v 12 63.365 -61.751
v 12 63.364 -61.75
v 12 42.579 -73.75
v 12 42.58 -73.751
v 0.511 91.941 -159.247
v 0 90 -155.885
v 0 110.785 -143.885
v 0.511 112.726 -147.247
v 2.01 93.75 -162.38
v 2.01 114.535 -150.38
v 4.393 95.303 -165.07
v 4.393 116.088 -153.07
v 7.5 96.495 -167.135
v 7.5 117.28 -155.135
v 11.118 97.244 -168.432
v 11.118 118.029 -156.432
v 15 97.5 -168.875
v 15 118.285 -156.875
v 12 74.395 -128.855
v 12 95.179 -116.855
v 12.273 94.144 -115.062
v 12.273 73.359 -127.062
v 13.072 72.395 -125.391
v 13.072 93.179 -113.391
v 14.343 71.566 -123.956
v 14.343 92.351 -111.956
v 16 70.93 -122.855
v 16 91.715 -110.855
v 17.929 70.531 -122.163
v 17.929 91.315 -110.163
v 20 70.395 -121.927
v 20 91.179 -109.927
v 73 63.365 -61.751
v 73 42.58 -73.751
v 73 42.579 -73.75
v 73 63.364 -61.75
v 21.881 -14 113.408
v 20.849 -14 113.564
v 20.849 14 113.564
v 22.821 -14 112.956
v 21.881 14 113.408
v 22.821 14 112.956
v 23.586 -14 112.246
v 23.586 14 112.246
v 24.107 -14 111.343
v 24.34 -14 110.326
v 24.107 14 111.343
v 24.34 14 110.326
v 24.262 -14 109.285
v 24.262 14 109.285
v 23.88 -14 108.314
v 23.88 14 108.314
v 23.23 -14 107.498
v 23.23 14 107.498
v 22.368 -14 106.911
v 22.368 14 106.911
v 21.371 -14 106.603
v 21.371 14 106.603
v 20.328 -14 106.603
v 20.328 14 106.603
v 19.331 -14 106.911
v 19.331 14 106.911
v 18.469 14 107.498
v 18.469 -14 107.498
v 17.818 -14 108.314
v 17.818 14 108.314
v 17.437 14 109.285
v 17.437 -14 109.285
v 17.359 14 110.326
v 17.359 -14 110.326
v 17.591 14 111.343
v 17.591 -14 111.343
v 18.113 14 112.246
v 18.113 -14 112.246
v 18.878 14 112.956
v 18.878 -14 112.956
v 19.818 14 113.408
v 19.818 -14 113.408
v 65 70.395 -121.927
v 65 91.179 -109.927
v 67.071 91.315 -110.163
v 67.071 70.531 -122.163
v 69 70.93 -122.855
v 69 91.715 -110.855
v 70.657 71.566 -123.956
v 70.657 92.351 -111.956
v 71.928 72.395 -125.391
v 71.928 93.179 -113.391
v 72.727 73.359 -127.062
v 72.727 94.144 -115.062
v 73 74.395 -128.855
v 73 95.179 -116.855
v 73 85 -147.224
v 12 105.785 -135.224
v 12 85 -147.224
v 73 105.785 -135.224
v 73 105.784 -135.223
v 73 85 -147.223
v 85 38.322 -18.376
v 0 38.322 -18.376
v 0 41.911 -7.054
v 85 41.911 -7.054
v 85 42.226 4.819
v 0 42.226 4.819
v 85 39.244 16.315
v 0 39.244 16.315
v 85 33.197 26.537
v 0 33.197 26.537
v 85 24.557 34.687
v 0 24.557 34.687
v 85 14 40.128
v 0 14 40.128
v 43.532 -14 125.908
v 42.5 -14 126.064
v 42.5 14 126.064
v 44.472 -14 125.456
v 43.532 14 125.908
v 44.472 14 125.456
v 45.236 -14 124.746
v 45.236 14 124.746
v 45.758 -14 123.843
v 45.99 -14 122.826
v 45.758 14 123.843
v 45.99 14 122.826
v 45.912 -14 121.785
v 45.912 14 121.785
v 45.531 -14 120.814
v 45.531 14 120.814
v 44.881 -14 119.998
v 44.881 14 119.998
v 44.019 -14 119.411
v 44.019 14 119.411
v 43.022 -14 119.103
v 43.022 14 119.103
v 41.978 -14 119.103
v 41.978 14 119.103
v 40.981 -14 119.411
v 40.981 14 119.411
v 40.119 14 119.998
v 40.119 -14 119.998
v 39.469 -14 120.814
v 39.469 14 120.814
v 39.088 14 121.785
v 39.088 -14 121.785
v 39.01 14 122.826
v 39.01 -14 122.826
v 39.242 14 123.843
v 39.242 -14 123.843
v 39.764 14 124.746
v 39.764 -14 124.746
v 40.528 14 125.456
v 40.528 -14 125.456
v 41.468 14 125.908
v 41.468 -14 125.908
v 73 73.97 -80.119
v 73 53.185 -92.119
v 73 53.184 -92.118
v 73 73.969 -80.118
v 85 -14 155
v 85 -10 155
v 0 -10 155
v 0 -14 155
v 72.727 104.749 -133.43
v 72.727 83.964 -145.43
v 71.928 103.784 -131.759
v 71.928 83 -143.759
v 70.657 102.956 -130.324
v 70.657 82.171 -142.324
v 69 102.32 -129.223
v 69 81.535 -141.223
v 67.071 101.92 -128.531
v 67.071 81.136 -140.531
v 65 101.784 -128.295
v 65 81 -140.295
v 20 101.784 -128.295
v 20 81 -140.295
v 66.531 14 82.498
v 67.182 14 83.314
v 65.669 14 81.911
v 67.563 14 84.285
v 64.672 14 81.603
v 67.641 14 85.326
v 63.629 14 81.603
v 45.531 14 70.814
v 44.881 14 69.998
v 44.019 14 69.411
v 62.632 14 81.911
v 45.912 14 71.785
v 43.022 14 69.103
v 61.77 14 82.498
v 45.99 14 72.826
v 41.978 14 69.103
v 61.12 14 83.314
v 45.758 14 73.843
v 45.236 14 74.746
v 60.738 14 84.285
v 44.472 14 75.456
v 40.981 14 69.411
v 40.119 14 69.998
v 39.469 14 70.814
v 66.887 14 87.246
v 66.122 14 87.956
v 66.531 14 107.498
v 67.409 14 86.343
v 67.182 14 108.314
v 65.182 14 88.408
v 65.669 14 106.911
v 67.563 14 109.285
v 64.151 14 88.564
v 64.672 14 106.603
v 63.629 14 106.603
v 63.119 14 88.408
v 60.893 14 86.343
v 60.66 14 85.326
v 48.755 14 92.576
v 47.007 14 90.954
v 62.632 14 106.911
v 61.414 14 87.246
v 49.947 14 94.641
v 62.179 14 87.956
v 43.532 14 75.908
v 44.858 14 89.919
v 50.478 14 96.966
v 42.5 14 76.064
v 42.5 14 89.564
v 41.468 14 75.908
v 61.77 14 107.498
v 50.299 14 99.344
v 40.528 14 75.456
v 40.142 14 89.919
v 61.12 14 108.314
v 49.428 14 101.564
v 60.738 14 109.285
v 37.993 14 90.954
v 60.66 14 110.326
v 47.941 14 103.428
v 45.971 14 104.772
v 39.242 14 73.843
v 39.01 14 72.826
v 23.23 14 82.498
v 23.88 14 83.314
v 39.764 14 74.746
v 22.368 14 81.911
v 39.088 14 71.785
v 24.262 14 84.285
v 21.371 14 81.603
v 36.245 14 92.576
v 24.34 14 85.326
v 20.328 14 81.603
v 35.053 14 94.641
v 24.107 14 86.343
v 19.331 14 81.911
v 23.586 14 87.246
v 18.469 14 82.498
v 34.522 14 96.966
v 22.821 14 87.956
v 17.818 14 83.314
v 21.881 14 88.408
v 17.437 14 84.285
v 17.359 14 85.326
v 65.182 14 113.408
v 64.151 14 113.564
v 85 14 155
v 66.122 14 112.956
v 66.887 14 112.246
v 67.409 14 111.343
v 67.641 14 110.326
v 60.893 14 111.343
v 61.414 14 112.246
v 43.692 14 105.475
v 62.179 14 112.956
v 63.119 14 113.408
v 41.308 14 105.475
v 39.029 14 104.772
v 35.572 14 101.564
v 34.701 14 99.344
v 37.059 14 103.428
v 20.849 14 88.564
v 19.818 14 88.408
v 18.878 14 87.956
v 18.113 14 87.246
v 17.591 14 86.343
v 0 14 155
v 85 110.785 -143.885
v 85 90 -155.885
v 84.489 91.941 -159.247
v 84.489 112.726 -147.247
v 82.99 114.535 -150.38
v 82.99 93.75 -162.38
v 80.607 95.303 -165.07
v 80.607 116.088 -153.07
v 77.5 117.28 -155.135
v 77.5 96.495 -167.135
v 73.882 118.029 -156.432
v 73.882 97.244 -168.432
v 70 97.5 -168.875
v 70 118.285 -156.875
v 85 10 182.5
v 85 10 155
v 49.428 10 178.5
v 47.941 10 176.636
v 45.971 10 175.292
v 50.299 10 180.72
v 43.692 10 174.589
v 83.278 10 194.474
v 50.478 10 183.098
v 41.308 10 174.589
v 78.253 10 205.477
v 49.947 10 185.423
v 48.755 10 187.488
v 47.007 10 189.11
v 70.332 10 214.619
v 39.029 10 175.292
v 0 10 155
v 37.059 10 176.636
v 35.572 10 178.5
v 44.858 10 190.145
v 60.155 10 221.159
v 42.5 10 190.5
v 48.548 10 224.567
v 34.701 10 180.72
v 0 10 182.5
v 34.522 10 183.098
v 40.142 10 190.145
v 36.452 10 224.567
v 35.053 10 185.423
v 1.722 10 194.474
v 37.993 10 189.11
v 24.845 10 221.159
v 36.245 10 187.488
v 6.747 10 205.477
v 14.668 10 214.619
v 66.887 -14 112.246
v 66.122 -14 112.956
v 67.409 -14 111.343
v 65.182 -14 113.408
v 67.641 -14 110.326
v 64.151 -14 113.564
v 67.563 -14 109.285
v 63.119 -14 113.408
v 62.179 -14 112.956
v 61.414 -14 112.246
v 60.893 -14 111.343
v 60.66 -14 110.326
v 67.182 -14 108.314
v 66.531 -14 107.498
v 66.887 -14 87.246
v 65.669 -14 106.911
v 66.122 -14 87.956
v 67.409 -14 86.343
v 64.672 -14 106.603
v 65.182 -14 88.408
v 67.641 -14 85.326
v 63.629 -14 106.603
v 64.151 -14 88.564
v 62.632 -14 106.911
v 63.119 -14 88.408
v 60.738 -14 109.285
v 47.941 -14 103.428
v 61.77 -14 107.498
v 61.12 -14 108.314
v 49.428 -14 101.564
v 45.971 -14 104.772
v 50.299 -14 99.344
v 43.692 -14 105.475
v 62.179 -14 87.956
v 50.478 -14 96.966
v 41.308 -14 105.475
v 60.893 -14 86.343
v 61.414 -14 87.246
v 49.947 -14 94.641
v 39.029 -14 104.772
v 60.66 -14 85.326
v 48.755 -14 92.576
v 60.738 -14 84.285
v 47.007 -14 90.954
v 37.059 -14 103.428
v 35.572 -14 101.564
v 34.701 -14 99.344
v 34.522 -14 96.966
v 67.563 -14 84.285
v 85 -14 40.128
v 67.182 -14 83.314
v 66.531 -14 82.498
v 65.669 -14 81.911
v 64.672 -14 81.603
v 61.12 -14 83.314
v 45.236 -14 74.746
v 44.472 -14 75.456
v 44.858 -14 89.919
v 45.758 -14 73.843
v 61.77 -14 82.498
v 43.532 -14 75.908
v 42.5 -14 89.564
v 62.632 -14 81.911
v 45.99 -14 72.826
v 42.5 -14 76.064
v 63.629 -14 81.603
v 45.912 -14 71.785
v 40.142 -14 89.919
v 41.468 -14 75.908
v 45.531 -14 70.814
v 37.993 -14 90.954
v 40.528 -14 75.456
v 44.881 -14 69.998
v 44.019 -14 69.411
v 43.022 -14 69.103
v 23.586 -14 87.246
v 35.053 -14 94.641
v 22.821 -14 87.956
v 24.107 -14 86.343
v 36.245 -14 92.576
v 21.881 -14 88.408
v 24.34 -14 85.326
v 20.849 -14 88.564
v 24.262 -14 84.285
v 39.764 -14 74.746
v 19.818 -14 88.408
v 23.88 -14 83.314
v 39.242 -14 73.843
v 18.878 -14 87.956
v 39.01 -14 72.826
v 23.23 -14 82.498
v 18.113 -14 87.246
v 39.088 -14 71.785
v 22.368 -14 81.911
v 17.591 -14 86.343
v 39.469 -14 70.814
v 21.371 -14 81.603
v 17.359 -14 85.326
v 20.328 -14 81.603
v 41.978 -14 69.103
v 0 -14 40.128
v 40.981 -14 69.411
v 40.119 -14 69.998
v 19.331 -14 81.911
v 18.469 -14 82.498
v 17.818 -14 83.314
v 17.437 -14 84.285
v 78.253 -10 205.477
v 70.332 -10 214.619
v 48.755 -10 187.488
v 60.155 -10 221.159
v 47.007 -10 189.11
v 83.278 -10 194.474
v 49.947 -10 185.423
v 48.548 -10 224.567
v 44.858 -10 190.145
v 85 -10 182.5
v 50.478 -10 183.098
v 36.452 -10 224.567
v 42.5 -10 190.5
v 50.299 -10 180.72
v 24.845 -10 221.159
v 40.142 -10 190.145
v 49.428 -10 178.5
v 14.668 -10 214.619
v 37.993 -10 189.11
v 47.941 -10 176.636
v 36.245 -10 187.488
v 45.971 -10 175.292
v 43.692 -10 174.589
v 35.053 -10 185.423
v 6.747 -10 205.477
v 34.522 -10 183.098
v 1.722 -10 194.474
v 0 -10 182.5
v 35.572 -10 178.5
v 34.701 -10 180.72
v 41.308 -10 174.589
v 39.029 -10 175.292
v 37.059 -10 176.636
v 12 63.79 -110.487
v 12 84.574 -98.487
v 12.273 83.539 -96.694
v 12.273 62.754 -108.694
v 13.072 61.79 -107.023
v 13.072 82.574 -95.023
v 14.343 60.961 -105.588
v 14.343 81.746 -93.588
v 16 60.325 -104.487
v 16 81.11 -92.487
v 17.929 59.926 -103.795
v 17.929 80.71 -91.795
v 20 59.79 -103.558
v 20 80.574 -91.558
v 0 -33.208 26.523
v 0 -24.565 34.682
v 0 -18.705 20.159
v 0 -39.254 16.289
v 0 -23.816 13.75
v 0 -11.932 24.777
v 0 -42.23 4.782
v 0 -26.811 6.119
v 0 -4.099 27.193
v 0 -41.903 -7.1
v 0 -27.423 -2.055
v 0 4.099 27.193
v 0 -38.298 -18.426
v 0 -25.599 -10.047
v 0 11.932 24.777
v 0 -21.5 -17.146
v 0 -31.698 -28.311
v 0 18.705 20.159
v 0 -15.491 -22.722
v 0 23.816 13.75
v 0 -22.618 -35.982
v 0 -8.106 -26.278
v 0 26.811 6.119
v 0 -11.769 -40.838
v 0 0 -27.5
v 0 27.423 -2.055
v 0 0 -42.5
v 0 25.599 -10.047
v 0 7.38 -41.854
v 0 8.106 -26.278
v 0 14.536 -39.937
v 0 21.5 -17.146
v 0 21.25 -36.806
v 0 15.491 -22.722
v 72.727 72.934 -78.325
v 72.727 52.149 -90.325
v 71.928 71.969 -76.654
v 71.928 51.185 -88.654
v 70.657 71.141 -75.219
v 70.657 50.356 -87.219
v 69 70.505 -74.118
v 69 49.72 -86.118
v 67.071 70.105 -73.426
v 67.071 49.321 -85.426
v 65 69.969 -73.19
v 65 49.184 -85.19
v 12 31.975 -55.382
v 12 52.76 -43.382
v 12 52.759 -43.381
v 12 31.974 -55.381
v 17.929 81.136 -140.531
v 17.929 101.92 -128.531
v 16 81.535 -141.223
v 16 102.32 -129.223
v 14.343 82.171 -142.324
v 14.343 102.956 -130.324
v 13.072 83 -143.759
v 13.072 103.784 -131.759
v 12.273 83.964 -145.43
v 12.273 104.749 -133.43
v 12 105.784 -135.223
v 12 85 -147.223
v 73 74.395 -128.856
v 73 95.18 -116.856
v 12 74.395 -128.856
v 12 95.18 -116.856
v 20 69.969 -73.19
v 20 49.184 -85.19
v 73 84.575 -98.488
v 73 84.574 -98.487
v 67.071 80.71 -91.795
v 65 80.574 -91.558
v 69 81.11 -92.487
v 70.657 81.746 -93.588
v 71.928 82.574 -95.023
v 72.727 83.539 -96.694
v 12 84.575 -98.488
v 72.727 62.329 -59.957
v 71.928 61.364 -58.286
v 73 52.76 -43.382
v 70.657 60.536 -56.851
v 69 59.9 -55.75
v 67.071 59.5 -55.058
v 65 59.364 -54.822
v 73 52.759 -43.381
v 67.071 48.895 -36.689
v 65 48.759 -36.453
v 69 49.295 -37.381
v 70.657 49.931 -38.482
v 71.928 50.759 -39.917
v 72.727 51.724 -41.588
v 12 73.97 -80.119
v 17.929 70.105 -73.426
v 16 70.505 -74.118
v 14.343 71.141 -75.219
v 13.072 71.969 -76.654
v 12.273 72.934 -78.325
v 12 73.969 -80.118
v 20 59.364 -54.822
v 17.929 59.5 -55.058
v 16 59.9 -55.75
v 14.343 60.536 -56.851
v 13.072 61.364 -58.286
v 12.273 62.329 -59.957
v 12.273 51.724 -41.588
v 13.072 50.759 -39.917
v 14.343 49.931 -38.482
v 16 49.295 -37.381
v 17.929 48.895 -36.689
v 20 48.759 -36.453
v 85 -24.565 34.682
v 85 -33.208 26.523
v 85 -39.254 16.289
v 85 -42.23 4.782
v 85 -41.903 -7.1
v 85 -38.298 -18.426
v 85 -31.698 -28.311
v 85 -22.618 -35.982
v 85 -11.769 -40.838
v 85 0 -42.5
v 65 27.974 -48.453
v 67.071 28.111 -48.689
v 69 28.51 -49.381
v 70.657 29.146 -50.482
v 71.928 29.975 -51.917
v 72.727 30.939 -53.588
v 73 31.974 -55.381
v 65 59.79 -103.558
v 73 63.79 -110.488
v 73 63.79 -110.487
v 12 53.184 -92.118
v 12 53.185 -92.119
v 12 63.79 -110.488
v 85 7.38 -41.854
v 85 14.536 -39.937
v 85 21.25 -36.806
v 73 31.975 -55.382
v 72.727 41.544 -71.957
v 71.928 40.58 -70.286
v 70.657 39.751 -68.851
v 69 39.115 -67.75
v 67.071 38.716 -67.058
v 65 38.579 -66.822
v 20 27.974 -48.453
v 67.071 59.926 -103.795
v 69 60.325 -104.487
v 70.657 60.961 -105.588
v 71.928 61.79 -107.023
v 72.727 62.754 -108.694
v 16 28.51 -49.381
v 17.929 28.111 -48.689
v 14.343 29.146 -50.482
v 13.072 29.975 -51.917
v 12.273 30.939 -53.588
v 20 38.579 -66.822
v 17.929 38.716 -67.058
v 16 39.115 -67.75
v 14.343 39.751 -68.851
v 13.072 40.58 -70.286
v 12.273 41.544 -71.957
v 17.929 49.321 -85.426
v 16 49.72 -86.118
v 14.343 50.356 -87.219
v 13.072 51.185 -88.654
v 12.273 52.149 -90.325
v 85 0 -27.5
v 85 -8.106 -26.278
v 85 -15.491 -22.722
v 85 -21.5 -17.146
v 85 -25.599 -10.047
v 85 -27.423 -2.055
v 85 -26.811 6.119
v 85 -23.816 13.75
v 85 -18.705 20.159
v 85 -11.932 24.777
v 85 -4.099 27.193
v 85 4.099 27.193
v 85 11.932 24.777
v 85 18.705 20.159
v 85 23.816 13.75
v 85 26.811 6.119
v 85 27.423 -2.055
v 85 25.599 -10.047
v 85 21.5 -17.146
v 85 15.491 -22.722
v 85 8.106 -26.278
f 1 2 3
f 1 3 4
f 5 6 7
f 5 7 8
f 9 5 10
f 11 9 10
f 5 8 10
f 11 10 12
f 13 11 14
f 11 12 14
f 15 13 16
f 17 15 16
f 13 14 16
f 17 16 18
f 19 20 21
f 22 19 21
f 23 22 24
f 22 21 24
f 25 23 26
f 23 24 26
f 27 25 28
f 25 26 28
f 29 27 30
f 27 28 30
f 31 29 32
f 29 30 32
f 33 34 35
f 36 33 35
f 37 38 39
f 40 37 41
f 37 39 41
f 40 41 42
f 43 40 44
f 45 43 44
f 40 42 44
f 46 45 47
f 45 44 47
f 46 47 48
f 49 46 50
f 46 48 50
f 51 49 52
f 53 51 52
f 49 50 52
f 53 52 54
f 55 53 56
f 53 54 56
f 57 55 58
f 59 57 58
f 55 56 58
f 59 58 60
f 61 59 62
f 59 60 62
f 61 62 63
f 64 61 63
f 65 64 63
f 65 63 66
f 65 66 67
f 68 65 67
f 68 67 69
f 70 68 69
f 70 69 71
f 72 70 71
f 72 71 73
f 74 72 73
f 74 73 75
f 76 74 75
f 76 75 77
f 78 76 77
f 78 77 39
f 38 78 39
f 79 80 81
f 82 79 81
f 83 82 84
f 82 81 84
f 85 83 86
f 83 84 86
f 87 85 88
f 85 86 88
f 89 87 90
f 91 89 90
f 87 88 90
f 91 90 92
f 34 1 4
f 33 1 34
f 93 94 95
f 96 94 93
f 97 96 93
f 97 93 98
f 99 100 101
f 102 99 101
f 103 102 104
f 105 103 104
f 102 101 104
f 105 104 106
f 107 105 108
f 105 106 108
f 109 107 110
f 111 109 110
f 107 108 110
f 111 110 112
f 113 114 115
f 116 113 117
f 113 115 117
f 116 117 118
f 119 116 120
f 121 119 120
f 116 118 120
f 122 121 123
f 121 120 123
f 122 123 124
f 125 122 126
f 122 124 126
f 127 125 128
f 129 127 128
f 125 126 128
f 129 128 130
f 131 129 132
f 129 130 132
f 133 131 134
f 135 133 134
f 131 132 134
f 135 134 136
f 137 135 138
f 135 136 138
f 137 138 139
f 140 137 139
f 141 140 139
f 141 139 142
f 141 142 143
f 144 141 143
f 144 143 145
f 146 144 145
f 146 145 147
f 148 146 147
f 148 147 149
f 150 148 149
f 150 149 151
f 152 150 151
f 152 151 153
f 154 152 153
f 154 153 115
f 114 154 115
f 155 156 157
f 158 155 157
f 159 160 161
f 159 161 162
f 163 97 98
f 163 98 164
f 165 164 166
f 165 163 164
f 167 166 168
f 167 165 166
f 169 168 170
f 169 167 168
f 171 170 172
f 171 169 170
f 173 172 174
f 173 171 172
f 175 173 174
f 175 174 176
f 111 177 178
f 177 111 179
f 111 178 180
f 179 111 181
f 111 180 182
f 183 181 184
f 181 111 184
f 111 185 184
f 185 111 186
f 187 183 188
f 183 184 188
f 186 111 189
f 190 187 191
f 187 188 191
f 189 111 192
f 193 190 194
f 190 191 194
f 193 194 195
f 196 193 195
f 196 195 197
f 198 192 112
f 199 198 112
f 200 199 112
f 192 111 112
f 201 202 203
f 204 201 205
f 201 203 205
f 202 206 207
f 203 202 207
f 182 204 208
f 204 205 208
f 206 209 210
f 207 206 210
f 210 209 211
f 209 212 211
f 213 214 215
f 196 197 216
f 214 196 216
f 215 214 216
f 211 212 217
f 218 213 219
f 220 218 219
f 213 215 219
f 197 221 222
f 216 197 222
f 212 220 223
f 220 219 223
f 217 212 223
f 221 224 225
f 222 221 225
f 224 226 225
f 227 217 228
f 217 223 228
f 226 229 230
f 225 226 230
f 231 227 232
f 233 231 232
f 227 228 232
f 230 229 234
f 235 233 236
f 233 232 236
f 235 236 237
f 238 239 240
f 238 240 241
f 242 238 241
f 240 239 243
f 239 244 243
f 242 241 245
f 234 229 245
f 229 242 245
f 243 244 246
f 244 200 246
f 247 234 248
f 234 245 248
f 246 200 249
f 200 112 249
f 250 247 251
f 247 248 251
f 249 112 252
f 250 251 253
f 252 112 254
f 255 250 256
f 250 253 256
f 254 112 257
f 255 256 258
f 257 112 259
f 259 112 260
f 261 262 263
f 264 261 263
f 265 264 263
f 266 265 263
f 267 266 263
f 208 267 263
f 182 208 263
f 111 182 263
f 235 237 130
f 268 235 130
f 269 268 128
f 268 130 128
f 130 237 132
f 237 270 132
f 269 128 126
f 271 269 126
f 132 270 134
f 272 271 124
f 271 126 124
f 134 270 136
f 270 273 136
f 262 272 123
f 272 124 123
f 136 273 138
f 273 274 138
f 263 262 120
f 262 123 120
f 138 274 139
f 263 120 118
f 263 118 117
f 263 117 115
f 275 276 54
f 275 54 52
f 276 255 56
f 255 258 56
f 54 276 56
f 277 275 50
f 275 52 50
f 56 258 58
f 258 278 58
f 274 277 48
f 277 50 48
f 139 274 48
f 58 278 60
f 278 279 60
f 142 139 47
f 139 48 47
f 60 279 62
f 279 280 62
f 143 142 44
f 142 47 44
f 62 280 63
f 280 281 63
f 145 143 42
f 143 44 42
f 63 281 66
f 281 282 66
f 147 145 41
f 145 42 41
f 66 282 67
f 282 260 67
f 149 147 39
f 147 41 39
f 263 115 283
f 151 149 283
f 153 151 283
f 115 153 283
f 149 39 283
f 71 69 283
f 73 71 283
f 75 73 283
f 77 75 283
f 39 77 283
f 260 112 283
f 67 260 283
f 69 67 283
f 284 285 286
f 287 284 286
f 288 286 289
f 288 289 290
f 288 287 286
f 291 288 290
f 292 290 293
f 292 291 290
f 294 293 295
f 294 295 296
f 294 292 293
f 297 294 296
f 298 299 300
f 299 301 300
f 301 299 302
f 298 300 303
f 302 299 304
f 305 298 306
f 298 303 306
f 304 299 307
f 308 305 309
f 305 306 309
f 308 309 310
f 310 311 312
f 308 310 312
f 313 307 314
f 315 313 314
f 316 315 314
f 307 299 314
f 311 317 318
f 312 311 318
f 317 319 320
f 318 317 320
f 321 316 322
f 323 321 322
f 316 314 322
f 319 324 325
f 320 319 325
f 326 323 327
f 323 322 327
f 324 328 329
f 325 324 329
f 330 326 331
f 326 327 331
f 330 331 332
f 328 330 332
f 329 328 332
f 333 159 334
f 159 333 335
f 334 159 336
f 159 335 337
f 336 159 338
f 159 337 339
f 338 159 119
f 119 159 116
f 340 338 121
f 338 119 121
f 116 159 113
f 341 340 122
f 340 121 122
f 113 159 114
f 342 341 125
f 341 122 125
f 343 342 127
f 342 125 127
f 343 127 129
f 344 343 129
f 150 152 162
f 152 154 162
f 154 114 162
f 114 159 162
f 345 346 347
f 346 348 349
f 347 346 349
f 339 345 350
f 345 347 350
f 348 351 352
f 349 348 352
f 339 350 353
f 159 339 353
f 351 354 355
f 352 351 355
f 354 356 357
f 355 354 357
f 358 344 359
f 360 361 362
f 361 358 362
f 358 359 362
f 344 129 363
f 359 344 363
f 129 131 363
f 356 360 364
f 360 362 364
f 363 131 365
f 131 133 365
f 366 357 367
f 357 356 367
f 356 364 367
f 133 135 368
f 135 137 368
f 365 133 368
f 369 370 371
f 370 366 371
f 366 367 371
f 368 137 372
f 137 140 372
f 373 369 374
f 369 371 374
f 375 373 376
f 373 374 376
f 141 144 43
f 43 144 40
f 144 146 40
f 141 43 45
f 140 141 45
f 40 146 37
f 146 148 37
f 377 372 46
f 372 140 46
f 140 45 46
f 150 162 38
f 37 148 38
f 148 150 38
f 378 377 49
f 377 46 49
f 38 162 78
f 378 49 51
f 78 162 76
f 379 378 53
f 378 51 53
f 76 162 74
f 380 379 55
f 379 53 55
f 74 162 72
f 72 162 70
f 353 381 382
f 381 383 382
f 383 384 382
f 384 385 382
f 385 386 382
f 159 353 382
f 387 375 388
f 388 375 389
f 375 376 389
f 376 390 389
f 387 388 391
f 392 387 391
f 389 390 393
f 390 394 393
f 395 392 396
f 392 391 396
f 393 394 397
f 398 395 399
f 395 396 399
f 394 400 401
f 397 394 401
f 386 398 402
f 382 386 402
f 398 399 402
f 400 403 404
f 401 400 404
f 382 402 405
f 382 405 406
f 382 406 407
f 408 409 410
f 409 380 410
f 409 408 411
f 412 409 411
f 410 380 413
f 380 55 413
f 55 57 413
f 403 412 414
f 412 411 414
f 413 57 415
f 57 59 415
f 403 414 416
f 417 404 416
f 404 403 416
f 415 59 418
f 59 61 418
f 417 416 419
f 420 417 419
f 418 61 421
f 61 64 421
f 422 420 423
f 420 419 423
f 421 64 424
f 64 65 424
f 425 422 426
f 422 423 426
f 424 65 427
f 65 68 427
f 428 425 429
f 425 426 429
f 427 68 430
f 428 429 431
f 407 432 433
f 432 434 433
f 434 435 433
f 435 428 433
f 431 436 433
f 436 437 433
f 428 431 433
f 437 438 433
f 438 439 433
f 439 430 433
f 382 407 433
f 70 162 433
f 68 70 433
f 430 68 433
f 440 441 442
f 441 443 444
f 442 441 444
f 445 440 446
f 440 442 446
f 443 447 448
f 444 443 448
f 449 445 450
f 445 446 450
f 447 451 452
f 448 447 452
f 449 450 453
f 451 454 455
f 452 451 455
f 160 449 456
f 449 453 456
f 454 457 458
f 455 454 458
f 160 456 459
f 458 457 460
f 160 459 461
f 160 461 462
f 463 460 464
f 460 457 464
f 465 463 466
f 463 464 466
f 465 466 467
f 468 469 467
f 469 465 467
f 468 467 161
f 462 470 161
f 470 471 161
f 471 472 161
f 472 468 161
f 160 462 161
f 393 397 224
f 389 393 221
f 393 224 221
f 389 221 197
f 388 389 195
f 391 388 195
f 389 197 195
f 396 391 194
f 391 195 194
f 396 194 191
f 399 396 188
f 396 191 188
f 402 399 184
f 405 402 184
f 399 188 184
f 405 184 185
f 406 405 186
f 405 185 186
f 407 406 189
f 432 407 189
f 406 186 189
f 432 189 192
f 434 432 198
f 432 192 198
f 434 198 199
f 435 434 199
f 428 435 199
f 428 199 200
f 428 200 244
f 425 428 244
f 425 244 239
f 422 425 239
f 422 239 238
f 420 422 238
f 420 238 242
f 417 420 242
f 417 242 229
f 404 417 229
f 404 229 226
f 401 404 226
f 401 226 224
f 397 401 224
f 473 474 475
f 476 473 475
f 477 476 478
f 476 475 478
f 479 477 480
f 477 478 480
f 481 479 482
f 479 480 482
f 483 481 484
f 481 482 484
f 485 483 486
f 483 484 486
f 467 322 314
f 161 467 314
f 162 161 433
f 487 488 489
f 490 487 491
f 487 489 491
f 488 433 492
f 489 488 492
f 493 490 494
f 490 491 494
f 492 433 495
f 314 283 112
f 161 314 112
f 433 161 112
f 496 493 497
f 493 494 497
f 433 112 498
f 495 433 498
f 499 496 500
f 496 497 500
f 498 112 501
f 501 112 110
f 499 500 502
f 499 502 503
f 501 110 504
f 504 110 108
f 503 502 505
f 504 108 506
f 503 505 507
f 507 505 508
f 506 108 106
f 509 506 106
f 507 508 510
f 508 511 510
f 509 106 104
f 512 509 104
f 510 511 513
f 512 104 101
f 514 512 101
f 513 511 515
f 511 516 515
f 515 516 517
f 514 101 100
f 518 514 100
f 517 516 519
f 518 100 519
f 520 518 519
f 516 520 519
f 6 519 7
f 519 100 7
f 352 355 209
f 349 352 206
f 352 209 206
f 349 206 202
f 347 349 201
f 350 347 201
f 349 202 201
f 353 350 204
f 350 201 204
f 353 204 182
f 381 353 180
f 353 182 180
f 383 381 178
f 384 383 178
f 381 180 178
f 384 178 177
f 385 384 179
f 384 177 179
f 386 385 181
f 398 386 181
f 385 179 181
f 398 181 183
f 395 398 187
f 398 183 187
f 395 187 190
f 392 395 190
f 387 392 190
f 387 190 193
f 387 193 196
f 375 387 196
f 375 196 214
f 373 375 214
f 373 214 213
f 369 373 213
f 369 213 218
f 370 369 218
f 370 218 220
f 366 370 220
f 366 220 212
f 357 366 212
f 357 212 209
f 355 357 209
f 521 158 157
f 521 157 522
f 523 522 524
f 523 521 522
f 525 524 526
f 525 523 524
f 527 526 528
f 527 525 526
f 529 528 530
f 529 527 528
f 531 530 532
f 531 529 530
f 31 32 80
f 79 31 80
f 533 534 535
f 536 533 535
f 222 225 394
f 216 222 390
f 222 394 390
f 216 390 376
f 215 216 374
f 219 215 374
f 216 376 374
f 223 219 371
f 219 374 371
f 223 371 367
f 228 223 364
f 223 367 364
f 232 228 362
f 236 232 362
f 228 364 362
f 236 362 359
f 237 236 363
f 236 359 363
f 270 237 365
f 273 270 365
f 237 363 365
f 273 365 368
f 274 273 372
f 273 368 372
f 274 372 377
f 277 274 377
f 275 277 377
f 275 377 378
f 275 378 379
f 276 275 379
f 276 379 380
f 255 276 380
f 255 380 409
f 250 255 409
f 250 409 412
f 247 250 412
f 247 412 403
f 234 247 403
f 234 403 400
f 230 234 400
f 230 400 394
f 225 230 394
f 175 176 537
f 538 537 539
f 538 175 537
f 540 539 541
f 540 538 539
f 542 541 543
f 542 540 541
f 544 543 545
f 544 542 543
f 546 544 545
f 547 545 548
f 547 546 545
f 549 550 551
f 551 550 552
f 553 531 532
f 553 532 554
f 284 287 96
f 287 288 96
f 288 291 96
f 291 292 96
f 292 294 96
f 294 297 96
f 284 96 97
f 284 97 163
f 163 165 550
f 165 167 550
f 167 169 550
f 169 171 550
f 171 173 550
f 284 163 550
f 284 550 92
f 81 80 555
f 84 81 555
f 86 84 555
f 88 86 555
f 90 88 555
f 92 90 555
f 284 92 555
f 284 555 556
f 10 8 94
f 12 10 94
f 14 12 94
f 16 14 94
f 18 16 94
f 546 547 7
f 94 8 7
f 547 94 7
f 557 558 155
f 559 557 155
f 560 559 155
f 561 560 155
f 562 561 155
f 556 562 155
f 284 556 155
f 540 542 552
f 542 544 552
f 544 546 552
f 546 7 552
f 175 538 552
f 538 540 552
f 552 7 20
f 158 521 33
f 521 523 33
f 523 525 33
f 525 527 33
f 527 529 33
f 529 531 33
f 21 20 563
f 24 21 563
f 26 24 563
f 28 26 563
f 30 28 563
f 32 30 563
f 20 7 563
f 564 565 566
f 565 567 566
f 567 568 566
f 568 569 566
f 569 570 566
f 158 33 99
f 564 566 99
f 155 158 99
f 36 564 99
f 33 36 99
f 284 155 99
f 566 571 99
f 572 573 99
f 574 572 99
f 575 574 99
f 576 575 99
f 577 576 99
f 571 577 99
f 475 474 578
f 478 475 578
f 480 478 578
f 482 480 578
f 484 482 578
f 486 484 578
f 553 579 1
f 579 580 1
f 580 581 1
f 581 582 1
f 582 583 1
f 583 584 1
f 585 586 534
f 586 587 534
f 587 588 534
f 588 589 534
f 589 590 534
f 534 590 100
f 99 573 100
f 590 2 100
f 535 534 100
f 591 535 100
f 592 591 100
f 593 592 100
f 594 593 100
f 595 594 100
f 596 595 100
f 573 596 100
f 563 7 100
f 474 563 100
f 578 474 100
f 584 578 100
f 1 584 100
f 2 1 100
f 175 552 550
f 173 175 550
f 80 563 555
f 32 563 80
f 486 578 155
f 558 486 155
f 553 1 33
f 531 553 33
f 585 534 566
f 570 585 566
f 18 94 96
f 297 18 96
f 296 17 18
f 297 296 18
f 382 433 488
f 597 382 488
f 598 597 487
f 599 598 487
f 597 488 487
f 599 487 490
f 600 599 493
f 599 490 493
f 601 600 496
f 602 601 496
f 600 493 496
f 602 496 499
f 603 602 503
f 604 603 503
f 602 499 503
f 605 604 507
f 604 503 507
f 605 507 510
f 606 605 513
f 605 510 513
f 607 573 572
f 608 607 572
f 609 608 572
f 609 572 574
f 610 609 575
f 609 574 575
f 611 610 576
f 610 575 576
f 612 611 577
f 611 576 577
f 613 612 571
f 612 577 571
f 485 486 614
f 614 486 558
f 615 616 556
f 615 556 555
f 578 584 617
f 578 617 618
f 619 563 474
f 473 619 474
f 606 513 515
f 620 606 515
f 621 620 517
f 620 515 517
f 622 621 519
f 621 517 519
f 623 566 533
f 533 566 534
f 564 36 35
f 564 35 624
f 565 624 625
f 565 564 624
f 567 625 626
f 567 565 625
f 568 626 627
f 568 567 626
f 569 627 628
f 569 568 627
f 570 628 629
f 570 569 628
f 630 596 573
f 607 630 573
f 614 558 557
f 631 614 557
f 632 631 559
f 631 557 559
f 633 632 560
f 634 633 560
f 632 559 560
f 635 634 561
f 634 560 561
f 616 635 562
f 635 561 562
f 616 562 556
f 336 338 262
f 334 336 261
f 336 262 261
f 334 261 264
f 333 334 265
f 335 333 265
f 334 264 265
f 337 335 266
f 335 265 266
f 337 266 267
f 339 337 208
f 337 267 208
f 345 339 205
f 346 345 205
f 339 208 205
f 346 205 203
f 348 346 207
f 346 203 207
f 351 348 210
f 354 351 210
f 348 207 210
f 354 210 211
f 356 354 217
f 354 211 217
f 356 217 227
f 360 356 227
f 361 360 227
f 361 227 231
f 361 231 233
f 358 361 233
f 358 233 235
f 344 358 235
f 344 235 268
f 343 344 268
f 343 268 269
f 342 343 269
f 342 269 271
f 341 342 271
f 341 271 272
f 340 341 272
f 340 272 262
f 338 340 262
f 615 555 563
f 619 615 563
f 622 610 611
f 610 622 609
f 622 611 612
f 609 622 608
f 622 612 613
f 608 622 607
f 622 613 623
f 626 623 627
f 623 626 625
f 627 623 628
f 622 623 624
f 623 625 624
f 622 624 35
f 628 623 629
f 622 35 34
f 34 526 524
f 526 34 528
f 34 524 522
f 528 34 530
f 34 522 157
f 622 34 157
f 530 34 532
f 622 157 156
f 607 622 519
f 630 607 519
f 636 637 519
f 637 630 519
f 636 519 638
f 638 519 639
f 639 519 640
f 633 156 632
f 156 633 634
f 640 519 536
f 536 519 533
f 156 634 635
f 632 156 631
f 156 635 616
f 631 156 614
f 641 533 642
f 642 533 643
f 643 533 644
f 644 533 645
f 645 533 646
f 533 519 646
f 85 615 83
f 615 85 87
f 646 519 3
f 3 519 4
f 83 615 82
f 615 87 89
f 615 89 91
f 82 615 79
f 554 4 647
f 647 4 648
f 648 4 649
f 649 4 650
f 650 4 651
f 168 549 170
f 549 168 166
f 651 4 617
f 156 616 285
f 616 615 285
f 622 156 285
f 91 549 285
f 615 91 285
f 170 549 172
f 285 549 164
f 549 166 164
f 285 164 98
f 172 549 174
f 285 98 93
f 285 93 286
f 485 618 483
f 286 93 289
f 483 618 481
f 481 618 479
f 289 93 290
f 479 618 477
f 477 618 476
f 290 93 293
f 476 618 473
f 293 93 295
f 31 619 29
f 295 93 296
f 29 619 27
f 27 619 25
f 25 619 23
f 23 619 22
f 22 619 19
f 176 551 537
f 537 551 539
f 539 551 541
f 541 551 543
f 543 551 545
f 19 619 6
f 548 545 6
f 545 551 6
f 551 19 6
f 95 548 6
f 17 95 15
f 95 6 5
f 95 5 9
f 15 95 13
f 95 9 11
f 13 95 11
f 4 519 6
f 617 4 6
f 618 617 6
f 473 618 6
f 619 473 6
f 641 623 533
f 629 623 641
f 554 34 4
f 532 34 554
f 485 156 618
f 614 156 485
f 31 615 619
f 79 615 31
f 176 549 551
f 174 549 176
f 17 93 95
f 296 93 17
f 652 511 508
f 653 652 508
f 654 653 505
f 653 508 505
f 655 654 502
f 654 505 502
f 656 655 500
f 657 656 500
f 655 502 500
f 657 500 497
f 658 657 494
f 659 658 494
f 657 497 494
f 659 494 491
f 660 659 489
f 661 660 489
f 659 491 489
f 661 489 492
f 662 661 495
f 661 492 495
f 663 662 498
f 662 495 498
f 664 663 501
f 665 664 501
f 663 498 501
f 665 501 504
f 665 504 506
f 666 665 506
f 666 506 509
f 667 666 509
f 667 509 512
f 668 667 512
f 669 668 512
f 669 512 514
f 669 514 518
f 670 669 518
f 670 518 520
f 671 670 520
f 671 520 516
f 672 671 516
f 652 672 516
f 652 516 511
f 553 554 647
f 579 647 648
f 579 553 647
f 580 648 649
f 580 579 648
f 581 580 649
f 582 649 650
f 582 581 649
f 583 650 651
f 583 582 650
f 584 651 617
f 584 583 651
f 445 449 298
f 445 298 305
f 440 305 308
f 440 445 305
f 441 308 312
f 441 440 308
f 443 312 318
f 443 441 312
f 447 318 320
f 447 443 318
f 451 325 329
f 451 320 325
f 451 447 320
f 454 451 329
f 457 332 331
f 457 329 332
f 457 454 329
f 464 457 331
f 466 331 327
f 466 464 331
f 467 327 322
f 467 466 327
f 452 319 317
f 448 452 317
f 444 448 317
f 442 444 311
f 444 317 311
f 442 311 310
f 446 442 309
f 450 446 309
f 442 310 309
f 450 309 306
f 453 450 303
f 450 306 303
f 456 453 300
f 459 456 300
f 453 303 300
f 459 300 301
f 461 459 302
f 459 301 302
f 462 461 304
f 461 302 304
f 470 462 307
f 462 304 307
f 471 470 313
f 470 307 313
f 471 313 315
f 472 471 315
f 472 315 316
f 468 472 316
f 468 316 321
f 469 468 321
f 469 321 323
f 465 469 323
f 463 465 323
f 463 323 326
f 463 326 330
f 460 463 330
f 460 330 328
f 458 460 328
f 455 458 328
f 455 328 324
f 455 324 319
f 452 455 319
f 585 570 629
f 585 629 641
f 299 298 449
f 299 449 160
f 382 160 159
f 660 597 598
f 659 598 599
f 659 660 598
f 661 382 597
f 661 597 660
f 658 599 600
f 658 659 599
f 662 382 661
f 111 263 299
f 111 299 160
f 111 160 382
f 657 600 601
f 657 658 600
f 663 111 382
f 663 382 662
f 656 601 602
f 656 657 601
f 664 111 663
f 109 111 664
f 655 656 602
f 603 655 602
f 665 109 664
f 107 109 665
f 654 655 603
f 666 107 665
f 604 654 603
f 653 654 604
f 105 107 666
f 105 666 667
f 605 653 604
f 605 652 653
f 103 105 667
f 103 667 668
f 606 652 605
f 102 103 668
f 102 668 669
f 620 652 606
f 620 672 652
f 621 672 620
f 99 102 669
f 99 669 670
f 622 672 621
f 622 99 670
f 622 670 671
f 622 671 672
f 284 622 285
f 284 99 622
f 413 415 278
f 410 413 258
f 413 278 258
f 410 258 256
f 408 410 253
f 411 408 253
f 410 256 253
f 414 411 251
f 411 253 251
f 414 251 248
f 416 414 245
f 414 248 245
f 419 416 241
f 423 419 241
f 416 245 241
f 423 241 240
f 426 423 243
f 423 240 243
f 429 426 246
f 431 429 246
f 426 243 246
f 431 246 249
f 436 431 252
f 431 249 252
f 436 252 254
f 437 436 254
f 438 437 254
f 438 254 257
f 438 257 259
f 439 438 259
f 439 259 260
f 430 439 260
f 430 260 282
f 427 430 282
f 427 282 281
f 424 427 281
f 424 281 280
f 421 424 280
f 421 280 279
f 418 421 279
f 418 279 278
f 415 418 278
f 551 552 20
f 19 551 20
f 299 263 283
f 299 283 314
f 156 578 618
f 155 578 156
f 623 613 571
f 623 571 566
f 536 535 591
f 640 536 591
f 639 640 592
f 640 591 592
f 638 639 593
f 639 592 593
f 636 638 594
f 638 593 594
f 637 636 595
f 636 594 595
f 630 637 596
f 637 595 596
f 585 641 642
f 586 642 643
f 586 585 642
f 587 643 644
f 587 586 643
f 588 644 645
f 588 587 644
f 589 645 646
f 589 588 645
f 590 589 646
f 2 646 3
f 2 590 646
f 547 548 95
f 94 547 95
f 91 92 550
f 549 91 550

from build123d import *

# Parameters (mm, degrees)
BOSS_EXTRUDE1_DEPTH        = 85
F_16_0_55_DIAMETER_HOLE1_D = 55
CUT_EXTRUDE1_DEPTH         = 85
FILLET1_RADIUS             = 42.5
FILLET1_LENGTH             = 20
F_16_0_16_DIAMETER_HOLE1_D = 16
F_16_0_16_DIAMETER_HOLE2_D = 16
SKETCH9_R                  = 3.5
CUT_EXTRUDE2_DEPTH         = 85
FILLET2_R                  = 15


with BuildPart() as part:
    # Sketch1 → Boss-Extrude1 (new body)
    with BuildSketch(Plane(origin=(0, 0, 0), x_dir=(0, 0, -1), z_dir=(1, 0, 0))):
        with BuildLine():
            ThreePointArc((-40.127920454, -14), (-42.5, 0), (-40.127920454, 14))
            Line((-40.127920454, 14), (-155, 14))
            Line((-155, 14), (-155, 10))
            Line((-155, 10), (-225, 10))
            Line((-225, 10), (-225, -10))
            Line((-225, -10), (-155, -10))
            Line((-155, -10), (-155, -14))
            Line((-155, -14), (-40.127920454, -14))
        make_face()
        with BuildLine():
            Line((36.806079661, 21.25), (0, 0))
            Line((0, 0), (0, -10))
            Line((0, -10), (0, -14))
            Line((0, -14), (-40.127920454, -14))
            ThreePointArc((-40.127920454, -14), (7.099766922, -41.902784032), (42.5, 0))
            ThreePointArc((42.5, 0), (41.051847617, 10.999809417), (36.806079661, 21.25))
        make_face()
        with BuildLine():
            Line((0, -10), (0, 0))
            Line((0, 0), (-8.082903769, 14))
            Line((-8.082903769, 14), (-40.127920454, 14))
            ThreePointArc((-40.127920454, 14), (-42.5, 0), (-40.127920454, -14))
            Line((-40.127920454, -14), (0, -14))
            Line((0, -14), (0, -10))
        make_face()
        with BuildLine():
            Line((-40.127920454, 14), (-8.082903769, 14))
            Line((-8.082903769, 14), (-12, 20.784609691))
            Line((-12, 20.784609691), (18.375771595, 38.322069598))
            ThreePointArc((18.375771595, 38.322069598), (-16.315016469, 39.243728641), (-40.127920454, 14))
        make_face()
        Polygon((-8.082903769, 14), (0, 0), (0, 10), (0, 14), align=None)
        with BuildLine():
            Line((0, 10), (0, 0))
            Line((0, 0), (36.806079661, 21.25))
            ThreePointArc((36.806079661, 21.25), (28.88118881, 31.178950157), (18.375771595, 38.322069598))
            Line((18.375771595, 38.322069598), (-12, 20.784609691))
            Line((-12, 20.784609691), (-8.082903769, 14))
            Line((-8.082903769, 14), (0, 14))
            Line((0, 14), (0, 10))
        make_face()
        with BuildLine():
            ThreePointArc((18.375771595, 38.322069598), (28.88118881, 31.178950157), (36.806079661, 21.25))
            Line((36.806079661, 21.25), (168.874953738, 97.5))
            Line((168.874953738, 97.5), (156.874953738, 118.284609691))
            Line((156.874953738, 118.284609691), (18.375771595, 38.322069598))
        make_face()
    extrude(amount=BOSS_EXTRUDE1_DEPTH)

    # Ø16.0 (55) Diameter Hole1 (through all)
    with Locations(Plane(origin=(85, 0, 0), x_dir=(0, 0, 1), z_dir=(1, 0, 0))):
        with Locations((0, 0)):
            Hole(F_16_0_55_DIAMETER_HOLE1_D / 2)

    # Sketch3 → Cut-Extrude1 (cut)
    with BuildSketch(Plane(origin=(0, 20.784609691, 12), x_dir=(1, 0, 0), z_dir=(0, 0.8660254037844386, 0.5000000000000002))):
        with BuildLine():
            Line((73, 127.58), (12, 127.58))
            Line((12, 127.58), (12, 127.579))
            ThreePointArc((12, 127.579), (14.343145751, 121.922145751), (20, 119.579))
            Line((20, 119.579), (65, 119.579))
            ThreePointArc((65, 119.579), (70.656854249, 121.922145751), (73, 127.579))
            Line((73, 127.579), (73, 127.58))
        make_face()
        with BuildLine():
            ThreePointArc((73, 106.369), (70.656854249, 100.712145751), (65, 98.369))
            Line((65, 98.369), (20, 98.369))
            ThreePointArc((20, 98.369), (14.343145751, 100.712145751), (12, 106.369))
            Line((12, 106.369), (12, 106.37))
            Line((12, 106.37), (73, 106.37))
            Line((73, 106.37), (73, 106.369))
        make_face()
        with BuildLine():
            ThreePointArc((73, 85.159), (70.656854249, 79.502145751), (65, 77.159))
            Line((65, 77.159), (20, 77.159))
            ThreePointArc((20, 77.159), (14.343145751, 79.502145751), (12, 85.159))
            Line((12, 85.159), (12, 85.16))
            Line((12, 85.16), (73, 85.16))
            Line((73, 85.16), (73, 85.159))
        make_face()
        with BuildLine():
            Line((73, 63.95), (12, 63.95))
            Line((12, 63.95), (12, 63.949))
            ThreePointArc((12, 63.949), (14.343145751, 58.292145751), (20, 55.949))
            Line((20, 55.949), (65, 55.949))
            ThreePointArc((65, 55.949), (70.656854249, 58.292145751), (73, 63.949))
            Line((73, 63.949), (73, 63.95))
        make_face()
        with BuildLine():
            Line((12, 170), (73, 170))
            Line((73, 170), (73, 169.999))
            ThreePointArc((73, 169.999), (70.656854249, 164.342145751), (65, 161.999))
            Line((65, 161.999), (20, 161.999))
            ThreePointArc((20, 161.999), (14.343145751, 164.342145751), (12, 169.999))
            Line((12, 169.999), (12, 170))
        make_face()
        with BuildLine():
            Line((73, 148.79), (12, 148.79))
            Line((12, 148.79), (12, 148.789))
            ThreePointArc((12, 148.789), (14.343145751, 143.132145751), (20, 140.789))
            Line((20, 140.789), (65, 140.789))
            ThreePointArc((65, 140.789), (70.656854249, 143.132145751), (73, 148.789))
            Line((73, 148.789), (73, 148.79))
        make_face()
    extrude(amount=-CUT_EXTRUDE1_DEPTH, mode=Mode.SUBTRACT)

    # Fillet1: full round fillet: the end face becomes a half cylinder, R = half its width
    fillet1_face = Plane((42.5, 0, 225), x_dir=(0, -1, 0), z_dir=(0, 0, 1))  # on the end face: x along it, z out of the body
    fillet1_slab = fillet1_face.offset(-FILLET1_RADIUS / 2) * Box(FILLET1_LENGTH, 2 * FILLET1_RADIUS, FILLET1_RADIUS, mode=Mode.PRIVATE)  # the body's end, R deep
    fillet1_round = Plane((42.5, 0, 182.5), x_dir=(0, 0, 1), z_dir=(0, -1, 0)) * Cylinder(FILLET1_RADIUS, FILLET1_LENGTH, mode=Mode.PRIVATE)  # its axis R under the face
    add(fillet1_slab - fillet1_round, mode=Mode.SUBTRACT)

    # Ø16.0 (16) Diameter Hole1 (through all)
    with Locations(Plane(origin=(42.5, -10, 182.5), x_dir=(0, 0, -1), z_dir=(0, -1, 0))):
        with Locations((0, 0)):
            Hole(F_16_0_16_DIAMETER_HOLE1_D / 2)

    # Ø16.0 (16) Diameter Hole2 (through all)
    with Locations(Plane(origin=(42.5, 14, 97.563960227), x_dir=(0, 0, 1), z_dir=(0, 1, 0))):
        with Locations((0, 0)):
            Hole(F_16_0_16_DIAMETER_HOLE2_D / 2)

    # Sketch9 → Cut-Extrude2 (cut)
    with BuildSketch(Plane(origin=(0, 14, 0), x_dir=(1, 0, 0), z_dir=(0, 1, 0))):
        with Locations(Location((42.5, -72.563960227, 0), (0, 0, 270))):
            Circle(SKETCH9_R)
        with Locations(Location((64.150635095, -85.063960227, 0), (0, 0, 270))):
            Circle(SKETCH9_R)
        with Locations(Location((64.150635095, -110.063960227, 0), (0, 0, 270))):
            Circle(SKETCH9_R)
        with Locations(Location((42.5, -122.563960227, 0), (0, 0, 270))):
            Circle(SKETCH9_R)
        with Locations(Location((20.849364905, -110.063960227, 0), (0, 0, 270))):
            Circle(SKETCH9_R)
        with Locations(Location((20.849364905, -85.063960227, 0), (0, 0, 270))):
            Circle(SKETCH9_R)
    extrude(amount=-CUT_EXTRUDE2_DEPTH, mode=Mode.SUBTRACT)

    # Fillet2
    fillet2_edges = [part.edges().sort_by_distance(p)[0] for p in [
        (85, 107.892304845, -162.874953738),
        (0, 107.892304845, -162.874953738),
    ]]
    fillet(fillet2_edges, radius=FILLET2_R)


solid = part.part
